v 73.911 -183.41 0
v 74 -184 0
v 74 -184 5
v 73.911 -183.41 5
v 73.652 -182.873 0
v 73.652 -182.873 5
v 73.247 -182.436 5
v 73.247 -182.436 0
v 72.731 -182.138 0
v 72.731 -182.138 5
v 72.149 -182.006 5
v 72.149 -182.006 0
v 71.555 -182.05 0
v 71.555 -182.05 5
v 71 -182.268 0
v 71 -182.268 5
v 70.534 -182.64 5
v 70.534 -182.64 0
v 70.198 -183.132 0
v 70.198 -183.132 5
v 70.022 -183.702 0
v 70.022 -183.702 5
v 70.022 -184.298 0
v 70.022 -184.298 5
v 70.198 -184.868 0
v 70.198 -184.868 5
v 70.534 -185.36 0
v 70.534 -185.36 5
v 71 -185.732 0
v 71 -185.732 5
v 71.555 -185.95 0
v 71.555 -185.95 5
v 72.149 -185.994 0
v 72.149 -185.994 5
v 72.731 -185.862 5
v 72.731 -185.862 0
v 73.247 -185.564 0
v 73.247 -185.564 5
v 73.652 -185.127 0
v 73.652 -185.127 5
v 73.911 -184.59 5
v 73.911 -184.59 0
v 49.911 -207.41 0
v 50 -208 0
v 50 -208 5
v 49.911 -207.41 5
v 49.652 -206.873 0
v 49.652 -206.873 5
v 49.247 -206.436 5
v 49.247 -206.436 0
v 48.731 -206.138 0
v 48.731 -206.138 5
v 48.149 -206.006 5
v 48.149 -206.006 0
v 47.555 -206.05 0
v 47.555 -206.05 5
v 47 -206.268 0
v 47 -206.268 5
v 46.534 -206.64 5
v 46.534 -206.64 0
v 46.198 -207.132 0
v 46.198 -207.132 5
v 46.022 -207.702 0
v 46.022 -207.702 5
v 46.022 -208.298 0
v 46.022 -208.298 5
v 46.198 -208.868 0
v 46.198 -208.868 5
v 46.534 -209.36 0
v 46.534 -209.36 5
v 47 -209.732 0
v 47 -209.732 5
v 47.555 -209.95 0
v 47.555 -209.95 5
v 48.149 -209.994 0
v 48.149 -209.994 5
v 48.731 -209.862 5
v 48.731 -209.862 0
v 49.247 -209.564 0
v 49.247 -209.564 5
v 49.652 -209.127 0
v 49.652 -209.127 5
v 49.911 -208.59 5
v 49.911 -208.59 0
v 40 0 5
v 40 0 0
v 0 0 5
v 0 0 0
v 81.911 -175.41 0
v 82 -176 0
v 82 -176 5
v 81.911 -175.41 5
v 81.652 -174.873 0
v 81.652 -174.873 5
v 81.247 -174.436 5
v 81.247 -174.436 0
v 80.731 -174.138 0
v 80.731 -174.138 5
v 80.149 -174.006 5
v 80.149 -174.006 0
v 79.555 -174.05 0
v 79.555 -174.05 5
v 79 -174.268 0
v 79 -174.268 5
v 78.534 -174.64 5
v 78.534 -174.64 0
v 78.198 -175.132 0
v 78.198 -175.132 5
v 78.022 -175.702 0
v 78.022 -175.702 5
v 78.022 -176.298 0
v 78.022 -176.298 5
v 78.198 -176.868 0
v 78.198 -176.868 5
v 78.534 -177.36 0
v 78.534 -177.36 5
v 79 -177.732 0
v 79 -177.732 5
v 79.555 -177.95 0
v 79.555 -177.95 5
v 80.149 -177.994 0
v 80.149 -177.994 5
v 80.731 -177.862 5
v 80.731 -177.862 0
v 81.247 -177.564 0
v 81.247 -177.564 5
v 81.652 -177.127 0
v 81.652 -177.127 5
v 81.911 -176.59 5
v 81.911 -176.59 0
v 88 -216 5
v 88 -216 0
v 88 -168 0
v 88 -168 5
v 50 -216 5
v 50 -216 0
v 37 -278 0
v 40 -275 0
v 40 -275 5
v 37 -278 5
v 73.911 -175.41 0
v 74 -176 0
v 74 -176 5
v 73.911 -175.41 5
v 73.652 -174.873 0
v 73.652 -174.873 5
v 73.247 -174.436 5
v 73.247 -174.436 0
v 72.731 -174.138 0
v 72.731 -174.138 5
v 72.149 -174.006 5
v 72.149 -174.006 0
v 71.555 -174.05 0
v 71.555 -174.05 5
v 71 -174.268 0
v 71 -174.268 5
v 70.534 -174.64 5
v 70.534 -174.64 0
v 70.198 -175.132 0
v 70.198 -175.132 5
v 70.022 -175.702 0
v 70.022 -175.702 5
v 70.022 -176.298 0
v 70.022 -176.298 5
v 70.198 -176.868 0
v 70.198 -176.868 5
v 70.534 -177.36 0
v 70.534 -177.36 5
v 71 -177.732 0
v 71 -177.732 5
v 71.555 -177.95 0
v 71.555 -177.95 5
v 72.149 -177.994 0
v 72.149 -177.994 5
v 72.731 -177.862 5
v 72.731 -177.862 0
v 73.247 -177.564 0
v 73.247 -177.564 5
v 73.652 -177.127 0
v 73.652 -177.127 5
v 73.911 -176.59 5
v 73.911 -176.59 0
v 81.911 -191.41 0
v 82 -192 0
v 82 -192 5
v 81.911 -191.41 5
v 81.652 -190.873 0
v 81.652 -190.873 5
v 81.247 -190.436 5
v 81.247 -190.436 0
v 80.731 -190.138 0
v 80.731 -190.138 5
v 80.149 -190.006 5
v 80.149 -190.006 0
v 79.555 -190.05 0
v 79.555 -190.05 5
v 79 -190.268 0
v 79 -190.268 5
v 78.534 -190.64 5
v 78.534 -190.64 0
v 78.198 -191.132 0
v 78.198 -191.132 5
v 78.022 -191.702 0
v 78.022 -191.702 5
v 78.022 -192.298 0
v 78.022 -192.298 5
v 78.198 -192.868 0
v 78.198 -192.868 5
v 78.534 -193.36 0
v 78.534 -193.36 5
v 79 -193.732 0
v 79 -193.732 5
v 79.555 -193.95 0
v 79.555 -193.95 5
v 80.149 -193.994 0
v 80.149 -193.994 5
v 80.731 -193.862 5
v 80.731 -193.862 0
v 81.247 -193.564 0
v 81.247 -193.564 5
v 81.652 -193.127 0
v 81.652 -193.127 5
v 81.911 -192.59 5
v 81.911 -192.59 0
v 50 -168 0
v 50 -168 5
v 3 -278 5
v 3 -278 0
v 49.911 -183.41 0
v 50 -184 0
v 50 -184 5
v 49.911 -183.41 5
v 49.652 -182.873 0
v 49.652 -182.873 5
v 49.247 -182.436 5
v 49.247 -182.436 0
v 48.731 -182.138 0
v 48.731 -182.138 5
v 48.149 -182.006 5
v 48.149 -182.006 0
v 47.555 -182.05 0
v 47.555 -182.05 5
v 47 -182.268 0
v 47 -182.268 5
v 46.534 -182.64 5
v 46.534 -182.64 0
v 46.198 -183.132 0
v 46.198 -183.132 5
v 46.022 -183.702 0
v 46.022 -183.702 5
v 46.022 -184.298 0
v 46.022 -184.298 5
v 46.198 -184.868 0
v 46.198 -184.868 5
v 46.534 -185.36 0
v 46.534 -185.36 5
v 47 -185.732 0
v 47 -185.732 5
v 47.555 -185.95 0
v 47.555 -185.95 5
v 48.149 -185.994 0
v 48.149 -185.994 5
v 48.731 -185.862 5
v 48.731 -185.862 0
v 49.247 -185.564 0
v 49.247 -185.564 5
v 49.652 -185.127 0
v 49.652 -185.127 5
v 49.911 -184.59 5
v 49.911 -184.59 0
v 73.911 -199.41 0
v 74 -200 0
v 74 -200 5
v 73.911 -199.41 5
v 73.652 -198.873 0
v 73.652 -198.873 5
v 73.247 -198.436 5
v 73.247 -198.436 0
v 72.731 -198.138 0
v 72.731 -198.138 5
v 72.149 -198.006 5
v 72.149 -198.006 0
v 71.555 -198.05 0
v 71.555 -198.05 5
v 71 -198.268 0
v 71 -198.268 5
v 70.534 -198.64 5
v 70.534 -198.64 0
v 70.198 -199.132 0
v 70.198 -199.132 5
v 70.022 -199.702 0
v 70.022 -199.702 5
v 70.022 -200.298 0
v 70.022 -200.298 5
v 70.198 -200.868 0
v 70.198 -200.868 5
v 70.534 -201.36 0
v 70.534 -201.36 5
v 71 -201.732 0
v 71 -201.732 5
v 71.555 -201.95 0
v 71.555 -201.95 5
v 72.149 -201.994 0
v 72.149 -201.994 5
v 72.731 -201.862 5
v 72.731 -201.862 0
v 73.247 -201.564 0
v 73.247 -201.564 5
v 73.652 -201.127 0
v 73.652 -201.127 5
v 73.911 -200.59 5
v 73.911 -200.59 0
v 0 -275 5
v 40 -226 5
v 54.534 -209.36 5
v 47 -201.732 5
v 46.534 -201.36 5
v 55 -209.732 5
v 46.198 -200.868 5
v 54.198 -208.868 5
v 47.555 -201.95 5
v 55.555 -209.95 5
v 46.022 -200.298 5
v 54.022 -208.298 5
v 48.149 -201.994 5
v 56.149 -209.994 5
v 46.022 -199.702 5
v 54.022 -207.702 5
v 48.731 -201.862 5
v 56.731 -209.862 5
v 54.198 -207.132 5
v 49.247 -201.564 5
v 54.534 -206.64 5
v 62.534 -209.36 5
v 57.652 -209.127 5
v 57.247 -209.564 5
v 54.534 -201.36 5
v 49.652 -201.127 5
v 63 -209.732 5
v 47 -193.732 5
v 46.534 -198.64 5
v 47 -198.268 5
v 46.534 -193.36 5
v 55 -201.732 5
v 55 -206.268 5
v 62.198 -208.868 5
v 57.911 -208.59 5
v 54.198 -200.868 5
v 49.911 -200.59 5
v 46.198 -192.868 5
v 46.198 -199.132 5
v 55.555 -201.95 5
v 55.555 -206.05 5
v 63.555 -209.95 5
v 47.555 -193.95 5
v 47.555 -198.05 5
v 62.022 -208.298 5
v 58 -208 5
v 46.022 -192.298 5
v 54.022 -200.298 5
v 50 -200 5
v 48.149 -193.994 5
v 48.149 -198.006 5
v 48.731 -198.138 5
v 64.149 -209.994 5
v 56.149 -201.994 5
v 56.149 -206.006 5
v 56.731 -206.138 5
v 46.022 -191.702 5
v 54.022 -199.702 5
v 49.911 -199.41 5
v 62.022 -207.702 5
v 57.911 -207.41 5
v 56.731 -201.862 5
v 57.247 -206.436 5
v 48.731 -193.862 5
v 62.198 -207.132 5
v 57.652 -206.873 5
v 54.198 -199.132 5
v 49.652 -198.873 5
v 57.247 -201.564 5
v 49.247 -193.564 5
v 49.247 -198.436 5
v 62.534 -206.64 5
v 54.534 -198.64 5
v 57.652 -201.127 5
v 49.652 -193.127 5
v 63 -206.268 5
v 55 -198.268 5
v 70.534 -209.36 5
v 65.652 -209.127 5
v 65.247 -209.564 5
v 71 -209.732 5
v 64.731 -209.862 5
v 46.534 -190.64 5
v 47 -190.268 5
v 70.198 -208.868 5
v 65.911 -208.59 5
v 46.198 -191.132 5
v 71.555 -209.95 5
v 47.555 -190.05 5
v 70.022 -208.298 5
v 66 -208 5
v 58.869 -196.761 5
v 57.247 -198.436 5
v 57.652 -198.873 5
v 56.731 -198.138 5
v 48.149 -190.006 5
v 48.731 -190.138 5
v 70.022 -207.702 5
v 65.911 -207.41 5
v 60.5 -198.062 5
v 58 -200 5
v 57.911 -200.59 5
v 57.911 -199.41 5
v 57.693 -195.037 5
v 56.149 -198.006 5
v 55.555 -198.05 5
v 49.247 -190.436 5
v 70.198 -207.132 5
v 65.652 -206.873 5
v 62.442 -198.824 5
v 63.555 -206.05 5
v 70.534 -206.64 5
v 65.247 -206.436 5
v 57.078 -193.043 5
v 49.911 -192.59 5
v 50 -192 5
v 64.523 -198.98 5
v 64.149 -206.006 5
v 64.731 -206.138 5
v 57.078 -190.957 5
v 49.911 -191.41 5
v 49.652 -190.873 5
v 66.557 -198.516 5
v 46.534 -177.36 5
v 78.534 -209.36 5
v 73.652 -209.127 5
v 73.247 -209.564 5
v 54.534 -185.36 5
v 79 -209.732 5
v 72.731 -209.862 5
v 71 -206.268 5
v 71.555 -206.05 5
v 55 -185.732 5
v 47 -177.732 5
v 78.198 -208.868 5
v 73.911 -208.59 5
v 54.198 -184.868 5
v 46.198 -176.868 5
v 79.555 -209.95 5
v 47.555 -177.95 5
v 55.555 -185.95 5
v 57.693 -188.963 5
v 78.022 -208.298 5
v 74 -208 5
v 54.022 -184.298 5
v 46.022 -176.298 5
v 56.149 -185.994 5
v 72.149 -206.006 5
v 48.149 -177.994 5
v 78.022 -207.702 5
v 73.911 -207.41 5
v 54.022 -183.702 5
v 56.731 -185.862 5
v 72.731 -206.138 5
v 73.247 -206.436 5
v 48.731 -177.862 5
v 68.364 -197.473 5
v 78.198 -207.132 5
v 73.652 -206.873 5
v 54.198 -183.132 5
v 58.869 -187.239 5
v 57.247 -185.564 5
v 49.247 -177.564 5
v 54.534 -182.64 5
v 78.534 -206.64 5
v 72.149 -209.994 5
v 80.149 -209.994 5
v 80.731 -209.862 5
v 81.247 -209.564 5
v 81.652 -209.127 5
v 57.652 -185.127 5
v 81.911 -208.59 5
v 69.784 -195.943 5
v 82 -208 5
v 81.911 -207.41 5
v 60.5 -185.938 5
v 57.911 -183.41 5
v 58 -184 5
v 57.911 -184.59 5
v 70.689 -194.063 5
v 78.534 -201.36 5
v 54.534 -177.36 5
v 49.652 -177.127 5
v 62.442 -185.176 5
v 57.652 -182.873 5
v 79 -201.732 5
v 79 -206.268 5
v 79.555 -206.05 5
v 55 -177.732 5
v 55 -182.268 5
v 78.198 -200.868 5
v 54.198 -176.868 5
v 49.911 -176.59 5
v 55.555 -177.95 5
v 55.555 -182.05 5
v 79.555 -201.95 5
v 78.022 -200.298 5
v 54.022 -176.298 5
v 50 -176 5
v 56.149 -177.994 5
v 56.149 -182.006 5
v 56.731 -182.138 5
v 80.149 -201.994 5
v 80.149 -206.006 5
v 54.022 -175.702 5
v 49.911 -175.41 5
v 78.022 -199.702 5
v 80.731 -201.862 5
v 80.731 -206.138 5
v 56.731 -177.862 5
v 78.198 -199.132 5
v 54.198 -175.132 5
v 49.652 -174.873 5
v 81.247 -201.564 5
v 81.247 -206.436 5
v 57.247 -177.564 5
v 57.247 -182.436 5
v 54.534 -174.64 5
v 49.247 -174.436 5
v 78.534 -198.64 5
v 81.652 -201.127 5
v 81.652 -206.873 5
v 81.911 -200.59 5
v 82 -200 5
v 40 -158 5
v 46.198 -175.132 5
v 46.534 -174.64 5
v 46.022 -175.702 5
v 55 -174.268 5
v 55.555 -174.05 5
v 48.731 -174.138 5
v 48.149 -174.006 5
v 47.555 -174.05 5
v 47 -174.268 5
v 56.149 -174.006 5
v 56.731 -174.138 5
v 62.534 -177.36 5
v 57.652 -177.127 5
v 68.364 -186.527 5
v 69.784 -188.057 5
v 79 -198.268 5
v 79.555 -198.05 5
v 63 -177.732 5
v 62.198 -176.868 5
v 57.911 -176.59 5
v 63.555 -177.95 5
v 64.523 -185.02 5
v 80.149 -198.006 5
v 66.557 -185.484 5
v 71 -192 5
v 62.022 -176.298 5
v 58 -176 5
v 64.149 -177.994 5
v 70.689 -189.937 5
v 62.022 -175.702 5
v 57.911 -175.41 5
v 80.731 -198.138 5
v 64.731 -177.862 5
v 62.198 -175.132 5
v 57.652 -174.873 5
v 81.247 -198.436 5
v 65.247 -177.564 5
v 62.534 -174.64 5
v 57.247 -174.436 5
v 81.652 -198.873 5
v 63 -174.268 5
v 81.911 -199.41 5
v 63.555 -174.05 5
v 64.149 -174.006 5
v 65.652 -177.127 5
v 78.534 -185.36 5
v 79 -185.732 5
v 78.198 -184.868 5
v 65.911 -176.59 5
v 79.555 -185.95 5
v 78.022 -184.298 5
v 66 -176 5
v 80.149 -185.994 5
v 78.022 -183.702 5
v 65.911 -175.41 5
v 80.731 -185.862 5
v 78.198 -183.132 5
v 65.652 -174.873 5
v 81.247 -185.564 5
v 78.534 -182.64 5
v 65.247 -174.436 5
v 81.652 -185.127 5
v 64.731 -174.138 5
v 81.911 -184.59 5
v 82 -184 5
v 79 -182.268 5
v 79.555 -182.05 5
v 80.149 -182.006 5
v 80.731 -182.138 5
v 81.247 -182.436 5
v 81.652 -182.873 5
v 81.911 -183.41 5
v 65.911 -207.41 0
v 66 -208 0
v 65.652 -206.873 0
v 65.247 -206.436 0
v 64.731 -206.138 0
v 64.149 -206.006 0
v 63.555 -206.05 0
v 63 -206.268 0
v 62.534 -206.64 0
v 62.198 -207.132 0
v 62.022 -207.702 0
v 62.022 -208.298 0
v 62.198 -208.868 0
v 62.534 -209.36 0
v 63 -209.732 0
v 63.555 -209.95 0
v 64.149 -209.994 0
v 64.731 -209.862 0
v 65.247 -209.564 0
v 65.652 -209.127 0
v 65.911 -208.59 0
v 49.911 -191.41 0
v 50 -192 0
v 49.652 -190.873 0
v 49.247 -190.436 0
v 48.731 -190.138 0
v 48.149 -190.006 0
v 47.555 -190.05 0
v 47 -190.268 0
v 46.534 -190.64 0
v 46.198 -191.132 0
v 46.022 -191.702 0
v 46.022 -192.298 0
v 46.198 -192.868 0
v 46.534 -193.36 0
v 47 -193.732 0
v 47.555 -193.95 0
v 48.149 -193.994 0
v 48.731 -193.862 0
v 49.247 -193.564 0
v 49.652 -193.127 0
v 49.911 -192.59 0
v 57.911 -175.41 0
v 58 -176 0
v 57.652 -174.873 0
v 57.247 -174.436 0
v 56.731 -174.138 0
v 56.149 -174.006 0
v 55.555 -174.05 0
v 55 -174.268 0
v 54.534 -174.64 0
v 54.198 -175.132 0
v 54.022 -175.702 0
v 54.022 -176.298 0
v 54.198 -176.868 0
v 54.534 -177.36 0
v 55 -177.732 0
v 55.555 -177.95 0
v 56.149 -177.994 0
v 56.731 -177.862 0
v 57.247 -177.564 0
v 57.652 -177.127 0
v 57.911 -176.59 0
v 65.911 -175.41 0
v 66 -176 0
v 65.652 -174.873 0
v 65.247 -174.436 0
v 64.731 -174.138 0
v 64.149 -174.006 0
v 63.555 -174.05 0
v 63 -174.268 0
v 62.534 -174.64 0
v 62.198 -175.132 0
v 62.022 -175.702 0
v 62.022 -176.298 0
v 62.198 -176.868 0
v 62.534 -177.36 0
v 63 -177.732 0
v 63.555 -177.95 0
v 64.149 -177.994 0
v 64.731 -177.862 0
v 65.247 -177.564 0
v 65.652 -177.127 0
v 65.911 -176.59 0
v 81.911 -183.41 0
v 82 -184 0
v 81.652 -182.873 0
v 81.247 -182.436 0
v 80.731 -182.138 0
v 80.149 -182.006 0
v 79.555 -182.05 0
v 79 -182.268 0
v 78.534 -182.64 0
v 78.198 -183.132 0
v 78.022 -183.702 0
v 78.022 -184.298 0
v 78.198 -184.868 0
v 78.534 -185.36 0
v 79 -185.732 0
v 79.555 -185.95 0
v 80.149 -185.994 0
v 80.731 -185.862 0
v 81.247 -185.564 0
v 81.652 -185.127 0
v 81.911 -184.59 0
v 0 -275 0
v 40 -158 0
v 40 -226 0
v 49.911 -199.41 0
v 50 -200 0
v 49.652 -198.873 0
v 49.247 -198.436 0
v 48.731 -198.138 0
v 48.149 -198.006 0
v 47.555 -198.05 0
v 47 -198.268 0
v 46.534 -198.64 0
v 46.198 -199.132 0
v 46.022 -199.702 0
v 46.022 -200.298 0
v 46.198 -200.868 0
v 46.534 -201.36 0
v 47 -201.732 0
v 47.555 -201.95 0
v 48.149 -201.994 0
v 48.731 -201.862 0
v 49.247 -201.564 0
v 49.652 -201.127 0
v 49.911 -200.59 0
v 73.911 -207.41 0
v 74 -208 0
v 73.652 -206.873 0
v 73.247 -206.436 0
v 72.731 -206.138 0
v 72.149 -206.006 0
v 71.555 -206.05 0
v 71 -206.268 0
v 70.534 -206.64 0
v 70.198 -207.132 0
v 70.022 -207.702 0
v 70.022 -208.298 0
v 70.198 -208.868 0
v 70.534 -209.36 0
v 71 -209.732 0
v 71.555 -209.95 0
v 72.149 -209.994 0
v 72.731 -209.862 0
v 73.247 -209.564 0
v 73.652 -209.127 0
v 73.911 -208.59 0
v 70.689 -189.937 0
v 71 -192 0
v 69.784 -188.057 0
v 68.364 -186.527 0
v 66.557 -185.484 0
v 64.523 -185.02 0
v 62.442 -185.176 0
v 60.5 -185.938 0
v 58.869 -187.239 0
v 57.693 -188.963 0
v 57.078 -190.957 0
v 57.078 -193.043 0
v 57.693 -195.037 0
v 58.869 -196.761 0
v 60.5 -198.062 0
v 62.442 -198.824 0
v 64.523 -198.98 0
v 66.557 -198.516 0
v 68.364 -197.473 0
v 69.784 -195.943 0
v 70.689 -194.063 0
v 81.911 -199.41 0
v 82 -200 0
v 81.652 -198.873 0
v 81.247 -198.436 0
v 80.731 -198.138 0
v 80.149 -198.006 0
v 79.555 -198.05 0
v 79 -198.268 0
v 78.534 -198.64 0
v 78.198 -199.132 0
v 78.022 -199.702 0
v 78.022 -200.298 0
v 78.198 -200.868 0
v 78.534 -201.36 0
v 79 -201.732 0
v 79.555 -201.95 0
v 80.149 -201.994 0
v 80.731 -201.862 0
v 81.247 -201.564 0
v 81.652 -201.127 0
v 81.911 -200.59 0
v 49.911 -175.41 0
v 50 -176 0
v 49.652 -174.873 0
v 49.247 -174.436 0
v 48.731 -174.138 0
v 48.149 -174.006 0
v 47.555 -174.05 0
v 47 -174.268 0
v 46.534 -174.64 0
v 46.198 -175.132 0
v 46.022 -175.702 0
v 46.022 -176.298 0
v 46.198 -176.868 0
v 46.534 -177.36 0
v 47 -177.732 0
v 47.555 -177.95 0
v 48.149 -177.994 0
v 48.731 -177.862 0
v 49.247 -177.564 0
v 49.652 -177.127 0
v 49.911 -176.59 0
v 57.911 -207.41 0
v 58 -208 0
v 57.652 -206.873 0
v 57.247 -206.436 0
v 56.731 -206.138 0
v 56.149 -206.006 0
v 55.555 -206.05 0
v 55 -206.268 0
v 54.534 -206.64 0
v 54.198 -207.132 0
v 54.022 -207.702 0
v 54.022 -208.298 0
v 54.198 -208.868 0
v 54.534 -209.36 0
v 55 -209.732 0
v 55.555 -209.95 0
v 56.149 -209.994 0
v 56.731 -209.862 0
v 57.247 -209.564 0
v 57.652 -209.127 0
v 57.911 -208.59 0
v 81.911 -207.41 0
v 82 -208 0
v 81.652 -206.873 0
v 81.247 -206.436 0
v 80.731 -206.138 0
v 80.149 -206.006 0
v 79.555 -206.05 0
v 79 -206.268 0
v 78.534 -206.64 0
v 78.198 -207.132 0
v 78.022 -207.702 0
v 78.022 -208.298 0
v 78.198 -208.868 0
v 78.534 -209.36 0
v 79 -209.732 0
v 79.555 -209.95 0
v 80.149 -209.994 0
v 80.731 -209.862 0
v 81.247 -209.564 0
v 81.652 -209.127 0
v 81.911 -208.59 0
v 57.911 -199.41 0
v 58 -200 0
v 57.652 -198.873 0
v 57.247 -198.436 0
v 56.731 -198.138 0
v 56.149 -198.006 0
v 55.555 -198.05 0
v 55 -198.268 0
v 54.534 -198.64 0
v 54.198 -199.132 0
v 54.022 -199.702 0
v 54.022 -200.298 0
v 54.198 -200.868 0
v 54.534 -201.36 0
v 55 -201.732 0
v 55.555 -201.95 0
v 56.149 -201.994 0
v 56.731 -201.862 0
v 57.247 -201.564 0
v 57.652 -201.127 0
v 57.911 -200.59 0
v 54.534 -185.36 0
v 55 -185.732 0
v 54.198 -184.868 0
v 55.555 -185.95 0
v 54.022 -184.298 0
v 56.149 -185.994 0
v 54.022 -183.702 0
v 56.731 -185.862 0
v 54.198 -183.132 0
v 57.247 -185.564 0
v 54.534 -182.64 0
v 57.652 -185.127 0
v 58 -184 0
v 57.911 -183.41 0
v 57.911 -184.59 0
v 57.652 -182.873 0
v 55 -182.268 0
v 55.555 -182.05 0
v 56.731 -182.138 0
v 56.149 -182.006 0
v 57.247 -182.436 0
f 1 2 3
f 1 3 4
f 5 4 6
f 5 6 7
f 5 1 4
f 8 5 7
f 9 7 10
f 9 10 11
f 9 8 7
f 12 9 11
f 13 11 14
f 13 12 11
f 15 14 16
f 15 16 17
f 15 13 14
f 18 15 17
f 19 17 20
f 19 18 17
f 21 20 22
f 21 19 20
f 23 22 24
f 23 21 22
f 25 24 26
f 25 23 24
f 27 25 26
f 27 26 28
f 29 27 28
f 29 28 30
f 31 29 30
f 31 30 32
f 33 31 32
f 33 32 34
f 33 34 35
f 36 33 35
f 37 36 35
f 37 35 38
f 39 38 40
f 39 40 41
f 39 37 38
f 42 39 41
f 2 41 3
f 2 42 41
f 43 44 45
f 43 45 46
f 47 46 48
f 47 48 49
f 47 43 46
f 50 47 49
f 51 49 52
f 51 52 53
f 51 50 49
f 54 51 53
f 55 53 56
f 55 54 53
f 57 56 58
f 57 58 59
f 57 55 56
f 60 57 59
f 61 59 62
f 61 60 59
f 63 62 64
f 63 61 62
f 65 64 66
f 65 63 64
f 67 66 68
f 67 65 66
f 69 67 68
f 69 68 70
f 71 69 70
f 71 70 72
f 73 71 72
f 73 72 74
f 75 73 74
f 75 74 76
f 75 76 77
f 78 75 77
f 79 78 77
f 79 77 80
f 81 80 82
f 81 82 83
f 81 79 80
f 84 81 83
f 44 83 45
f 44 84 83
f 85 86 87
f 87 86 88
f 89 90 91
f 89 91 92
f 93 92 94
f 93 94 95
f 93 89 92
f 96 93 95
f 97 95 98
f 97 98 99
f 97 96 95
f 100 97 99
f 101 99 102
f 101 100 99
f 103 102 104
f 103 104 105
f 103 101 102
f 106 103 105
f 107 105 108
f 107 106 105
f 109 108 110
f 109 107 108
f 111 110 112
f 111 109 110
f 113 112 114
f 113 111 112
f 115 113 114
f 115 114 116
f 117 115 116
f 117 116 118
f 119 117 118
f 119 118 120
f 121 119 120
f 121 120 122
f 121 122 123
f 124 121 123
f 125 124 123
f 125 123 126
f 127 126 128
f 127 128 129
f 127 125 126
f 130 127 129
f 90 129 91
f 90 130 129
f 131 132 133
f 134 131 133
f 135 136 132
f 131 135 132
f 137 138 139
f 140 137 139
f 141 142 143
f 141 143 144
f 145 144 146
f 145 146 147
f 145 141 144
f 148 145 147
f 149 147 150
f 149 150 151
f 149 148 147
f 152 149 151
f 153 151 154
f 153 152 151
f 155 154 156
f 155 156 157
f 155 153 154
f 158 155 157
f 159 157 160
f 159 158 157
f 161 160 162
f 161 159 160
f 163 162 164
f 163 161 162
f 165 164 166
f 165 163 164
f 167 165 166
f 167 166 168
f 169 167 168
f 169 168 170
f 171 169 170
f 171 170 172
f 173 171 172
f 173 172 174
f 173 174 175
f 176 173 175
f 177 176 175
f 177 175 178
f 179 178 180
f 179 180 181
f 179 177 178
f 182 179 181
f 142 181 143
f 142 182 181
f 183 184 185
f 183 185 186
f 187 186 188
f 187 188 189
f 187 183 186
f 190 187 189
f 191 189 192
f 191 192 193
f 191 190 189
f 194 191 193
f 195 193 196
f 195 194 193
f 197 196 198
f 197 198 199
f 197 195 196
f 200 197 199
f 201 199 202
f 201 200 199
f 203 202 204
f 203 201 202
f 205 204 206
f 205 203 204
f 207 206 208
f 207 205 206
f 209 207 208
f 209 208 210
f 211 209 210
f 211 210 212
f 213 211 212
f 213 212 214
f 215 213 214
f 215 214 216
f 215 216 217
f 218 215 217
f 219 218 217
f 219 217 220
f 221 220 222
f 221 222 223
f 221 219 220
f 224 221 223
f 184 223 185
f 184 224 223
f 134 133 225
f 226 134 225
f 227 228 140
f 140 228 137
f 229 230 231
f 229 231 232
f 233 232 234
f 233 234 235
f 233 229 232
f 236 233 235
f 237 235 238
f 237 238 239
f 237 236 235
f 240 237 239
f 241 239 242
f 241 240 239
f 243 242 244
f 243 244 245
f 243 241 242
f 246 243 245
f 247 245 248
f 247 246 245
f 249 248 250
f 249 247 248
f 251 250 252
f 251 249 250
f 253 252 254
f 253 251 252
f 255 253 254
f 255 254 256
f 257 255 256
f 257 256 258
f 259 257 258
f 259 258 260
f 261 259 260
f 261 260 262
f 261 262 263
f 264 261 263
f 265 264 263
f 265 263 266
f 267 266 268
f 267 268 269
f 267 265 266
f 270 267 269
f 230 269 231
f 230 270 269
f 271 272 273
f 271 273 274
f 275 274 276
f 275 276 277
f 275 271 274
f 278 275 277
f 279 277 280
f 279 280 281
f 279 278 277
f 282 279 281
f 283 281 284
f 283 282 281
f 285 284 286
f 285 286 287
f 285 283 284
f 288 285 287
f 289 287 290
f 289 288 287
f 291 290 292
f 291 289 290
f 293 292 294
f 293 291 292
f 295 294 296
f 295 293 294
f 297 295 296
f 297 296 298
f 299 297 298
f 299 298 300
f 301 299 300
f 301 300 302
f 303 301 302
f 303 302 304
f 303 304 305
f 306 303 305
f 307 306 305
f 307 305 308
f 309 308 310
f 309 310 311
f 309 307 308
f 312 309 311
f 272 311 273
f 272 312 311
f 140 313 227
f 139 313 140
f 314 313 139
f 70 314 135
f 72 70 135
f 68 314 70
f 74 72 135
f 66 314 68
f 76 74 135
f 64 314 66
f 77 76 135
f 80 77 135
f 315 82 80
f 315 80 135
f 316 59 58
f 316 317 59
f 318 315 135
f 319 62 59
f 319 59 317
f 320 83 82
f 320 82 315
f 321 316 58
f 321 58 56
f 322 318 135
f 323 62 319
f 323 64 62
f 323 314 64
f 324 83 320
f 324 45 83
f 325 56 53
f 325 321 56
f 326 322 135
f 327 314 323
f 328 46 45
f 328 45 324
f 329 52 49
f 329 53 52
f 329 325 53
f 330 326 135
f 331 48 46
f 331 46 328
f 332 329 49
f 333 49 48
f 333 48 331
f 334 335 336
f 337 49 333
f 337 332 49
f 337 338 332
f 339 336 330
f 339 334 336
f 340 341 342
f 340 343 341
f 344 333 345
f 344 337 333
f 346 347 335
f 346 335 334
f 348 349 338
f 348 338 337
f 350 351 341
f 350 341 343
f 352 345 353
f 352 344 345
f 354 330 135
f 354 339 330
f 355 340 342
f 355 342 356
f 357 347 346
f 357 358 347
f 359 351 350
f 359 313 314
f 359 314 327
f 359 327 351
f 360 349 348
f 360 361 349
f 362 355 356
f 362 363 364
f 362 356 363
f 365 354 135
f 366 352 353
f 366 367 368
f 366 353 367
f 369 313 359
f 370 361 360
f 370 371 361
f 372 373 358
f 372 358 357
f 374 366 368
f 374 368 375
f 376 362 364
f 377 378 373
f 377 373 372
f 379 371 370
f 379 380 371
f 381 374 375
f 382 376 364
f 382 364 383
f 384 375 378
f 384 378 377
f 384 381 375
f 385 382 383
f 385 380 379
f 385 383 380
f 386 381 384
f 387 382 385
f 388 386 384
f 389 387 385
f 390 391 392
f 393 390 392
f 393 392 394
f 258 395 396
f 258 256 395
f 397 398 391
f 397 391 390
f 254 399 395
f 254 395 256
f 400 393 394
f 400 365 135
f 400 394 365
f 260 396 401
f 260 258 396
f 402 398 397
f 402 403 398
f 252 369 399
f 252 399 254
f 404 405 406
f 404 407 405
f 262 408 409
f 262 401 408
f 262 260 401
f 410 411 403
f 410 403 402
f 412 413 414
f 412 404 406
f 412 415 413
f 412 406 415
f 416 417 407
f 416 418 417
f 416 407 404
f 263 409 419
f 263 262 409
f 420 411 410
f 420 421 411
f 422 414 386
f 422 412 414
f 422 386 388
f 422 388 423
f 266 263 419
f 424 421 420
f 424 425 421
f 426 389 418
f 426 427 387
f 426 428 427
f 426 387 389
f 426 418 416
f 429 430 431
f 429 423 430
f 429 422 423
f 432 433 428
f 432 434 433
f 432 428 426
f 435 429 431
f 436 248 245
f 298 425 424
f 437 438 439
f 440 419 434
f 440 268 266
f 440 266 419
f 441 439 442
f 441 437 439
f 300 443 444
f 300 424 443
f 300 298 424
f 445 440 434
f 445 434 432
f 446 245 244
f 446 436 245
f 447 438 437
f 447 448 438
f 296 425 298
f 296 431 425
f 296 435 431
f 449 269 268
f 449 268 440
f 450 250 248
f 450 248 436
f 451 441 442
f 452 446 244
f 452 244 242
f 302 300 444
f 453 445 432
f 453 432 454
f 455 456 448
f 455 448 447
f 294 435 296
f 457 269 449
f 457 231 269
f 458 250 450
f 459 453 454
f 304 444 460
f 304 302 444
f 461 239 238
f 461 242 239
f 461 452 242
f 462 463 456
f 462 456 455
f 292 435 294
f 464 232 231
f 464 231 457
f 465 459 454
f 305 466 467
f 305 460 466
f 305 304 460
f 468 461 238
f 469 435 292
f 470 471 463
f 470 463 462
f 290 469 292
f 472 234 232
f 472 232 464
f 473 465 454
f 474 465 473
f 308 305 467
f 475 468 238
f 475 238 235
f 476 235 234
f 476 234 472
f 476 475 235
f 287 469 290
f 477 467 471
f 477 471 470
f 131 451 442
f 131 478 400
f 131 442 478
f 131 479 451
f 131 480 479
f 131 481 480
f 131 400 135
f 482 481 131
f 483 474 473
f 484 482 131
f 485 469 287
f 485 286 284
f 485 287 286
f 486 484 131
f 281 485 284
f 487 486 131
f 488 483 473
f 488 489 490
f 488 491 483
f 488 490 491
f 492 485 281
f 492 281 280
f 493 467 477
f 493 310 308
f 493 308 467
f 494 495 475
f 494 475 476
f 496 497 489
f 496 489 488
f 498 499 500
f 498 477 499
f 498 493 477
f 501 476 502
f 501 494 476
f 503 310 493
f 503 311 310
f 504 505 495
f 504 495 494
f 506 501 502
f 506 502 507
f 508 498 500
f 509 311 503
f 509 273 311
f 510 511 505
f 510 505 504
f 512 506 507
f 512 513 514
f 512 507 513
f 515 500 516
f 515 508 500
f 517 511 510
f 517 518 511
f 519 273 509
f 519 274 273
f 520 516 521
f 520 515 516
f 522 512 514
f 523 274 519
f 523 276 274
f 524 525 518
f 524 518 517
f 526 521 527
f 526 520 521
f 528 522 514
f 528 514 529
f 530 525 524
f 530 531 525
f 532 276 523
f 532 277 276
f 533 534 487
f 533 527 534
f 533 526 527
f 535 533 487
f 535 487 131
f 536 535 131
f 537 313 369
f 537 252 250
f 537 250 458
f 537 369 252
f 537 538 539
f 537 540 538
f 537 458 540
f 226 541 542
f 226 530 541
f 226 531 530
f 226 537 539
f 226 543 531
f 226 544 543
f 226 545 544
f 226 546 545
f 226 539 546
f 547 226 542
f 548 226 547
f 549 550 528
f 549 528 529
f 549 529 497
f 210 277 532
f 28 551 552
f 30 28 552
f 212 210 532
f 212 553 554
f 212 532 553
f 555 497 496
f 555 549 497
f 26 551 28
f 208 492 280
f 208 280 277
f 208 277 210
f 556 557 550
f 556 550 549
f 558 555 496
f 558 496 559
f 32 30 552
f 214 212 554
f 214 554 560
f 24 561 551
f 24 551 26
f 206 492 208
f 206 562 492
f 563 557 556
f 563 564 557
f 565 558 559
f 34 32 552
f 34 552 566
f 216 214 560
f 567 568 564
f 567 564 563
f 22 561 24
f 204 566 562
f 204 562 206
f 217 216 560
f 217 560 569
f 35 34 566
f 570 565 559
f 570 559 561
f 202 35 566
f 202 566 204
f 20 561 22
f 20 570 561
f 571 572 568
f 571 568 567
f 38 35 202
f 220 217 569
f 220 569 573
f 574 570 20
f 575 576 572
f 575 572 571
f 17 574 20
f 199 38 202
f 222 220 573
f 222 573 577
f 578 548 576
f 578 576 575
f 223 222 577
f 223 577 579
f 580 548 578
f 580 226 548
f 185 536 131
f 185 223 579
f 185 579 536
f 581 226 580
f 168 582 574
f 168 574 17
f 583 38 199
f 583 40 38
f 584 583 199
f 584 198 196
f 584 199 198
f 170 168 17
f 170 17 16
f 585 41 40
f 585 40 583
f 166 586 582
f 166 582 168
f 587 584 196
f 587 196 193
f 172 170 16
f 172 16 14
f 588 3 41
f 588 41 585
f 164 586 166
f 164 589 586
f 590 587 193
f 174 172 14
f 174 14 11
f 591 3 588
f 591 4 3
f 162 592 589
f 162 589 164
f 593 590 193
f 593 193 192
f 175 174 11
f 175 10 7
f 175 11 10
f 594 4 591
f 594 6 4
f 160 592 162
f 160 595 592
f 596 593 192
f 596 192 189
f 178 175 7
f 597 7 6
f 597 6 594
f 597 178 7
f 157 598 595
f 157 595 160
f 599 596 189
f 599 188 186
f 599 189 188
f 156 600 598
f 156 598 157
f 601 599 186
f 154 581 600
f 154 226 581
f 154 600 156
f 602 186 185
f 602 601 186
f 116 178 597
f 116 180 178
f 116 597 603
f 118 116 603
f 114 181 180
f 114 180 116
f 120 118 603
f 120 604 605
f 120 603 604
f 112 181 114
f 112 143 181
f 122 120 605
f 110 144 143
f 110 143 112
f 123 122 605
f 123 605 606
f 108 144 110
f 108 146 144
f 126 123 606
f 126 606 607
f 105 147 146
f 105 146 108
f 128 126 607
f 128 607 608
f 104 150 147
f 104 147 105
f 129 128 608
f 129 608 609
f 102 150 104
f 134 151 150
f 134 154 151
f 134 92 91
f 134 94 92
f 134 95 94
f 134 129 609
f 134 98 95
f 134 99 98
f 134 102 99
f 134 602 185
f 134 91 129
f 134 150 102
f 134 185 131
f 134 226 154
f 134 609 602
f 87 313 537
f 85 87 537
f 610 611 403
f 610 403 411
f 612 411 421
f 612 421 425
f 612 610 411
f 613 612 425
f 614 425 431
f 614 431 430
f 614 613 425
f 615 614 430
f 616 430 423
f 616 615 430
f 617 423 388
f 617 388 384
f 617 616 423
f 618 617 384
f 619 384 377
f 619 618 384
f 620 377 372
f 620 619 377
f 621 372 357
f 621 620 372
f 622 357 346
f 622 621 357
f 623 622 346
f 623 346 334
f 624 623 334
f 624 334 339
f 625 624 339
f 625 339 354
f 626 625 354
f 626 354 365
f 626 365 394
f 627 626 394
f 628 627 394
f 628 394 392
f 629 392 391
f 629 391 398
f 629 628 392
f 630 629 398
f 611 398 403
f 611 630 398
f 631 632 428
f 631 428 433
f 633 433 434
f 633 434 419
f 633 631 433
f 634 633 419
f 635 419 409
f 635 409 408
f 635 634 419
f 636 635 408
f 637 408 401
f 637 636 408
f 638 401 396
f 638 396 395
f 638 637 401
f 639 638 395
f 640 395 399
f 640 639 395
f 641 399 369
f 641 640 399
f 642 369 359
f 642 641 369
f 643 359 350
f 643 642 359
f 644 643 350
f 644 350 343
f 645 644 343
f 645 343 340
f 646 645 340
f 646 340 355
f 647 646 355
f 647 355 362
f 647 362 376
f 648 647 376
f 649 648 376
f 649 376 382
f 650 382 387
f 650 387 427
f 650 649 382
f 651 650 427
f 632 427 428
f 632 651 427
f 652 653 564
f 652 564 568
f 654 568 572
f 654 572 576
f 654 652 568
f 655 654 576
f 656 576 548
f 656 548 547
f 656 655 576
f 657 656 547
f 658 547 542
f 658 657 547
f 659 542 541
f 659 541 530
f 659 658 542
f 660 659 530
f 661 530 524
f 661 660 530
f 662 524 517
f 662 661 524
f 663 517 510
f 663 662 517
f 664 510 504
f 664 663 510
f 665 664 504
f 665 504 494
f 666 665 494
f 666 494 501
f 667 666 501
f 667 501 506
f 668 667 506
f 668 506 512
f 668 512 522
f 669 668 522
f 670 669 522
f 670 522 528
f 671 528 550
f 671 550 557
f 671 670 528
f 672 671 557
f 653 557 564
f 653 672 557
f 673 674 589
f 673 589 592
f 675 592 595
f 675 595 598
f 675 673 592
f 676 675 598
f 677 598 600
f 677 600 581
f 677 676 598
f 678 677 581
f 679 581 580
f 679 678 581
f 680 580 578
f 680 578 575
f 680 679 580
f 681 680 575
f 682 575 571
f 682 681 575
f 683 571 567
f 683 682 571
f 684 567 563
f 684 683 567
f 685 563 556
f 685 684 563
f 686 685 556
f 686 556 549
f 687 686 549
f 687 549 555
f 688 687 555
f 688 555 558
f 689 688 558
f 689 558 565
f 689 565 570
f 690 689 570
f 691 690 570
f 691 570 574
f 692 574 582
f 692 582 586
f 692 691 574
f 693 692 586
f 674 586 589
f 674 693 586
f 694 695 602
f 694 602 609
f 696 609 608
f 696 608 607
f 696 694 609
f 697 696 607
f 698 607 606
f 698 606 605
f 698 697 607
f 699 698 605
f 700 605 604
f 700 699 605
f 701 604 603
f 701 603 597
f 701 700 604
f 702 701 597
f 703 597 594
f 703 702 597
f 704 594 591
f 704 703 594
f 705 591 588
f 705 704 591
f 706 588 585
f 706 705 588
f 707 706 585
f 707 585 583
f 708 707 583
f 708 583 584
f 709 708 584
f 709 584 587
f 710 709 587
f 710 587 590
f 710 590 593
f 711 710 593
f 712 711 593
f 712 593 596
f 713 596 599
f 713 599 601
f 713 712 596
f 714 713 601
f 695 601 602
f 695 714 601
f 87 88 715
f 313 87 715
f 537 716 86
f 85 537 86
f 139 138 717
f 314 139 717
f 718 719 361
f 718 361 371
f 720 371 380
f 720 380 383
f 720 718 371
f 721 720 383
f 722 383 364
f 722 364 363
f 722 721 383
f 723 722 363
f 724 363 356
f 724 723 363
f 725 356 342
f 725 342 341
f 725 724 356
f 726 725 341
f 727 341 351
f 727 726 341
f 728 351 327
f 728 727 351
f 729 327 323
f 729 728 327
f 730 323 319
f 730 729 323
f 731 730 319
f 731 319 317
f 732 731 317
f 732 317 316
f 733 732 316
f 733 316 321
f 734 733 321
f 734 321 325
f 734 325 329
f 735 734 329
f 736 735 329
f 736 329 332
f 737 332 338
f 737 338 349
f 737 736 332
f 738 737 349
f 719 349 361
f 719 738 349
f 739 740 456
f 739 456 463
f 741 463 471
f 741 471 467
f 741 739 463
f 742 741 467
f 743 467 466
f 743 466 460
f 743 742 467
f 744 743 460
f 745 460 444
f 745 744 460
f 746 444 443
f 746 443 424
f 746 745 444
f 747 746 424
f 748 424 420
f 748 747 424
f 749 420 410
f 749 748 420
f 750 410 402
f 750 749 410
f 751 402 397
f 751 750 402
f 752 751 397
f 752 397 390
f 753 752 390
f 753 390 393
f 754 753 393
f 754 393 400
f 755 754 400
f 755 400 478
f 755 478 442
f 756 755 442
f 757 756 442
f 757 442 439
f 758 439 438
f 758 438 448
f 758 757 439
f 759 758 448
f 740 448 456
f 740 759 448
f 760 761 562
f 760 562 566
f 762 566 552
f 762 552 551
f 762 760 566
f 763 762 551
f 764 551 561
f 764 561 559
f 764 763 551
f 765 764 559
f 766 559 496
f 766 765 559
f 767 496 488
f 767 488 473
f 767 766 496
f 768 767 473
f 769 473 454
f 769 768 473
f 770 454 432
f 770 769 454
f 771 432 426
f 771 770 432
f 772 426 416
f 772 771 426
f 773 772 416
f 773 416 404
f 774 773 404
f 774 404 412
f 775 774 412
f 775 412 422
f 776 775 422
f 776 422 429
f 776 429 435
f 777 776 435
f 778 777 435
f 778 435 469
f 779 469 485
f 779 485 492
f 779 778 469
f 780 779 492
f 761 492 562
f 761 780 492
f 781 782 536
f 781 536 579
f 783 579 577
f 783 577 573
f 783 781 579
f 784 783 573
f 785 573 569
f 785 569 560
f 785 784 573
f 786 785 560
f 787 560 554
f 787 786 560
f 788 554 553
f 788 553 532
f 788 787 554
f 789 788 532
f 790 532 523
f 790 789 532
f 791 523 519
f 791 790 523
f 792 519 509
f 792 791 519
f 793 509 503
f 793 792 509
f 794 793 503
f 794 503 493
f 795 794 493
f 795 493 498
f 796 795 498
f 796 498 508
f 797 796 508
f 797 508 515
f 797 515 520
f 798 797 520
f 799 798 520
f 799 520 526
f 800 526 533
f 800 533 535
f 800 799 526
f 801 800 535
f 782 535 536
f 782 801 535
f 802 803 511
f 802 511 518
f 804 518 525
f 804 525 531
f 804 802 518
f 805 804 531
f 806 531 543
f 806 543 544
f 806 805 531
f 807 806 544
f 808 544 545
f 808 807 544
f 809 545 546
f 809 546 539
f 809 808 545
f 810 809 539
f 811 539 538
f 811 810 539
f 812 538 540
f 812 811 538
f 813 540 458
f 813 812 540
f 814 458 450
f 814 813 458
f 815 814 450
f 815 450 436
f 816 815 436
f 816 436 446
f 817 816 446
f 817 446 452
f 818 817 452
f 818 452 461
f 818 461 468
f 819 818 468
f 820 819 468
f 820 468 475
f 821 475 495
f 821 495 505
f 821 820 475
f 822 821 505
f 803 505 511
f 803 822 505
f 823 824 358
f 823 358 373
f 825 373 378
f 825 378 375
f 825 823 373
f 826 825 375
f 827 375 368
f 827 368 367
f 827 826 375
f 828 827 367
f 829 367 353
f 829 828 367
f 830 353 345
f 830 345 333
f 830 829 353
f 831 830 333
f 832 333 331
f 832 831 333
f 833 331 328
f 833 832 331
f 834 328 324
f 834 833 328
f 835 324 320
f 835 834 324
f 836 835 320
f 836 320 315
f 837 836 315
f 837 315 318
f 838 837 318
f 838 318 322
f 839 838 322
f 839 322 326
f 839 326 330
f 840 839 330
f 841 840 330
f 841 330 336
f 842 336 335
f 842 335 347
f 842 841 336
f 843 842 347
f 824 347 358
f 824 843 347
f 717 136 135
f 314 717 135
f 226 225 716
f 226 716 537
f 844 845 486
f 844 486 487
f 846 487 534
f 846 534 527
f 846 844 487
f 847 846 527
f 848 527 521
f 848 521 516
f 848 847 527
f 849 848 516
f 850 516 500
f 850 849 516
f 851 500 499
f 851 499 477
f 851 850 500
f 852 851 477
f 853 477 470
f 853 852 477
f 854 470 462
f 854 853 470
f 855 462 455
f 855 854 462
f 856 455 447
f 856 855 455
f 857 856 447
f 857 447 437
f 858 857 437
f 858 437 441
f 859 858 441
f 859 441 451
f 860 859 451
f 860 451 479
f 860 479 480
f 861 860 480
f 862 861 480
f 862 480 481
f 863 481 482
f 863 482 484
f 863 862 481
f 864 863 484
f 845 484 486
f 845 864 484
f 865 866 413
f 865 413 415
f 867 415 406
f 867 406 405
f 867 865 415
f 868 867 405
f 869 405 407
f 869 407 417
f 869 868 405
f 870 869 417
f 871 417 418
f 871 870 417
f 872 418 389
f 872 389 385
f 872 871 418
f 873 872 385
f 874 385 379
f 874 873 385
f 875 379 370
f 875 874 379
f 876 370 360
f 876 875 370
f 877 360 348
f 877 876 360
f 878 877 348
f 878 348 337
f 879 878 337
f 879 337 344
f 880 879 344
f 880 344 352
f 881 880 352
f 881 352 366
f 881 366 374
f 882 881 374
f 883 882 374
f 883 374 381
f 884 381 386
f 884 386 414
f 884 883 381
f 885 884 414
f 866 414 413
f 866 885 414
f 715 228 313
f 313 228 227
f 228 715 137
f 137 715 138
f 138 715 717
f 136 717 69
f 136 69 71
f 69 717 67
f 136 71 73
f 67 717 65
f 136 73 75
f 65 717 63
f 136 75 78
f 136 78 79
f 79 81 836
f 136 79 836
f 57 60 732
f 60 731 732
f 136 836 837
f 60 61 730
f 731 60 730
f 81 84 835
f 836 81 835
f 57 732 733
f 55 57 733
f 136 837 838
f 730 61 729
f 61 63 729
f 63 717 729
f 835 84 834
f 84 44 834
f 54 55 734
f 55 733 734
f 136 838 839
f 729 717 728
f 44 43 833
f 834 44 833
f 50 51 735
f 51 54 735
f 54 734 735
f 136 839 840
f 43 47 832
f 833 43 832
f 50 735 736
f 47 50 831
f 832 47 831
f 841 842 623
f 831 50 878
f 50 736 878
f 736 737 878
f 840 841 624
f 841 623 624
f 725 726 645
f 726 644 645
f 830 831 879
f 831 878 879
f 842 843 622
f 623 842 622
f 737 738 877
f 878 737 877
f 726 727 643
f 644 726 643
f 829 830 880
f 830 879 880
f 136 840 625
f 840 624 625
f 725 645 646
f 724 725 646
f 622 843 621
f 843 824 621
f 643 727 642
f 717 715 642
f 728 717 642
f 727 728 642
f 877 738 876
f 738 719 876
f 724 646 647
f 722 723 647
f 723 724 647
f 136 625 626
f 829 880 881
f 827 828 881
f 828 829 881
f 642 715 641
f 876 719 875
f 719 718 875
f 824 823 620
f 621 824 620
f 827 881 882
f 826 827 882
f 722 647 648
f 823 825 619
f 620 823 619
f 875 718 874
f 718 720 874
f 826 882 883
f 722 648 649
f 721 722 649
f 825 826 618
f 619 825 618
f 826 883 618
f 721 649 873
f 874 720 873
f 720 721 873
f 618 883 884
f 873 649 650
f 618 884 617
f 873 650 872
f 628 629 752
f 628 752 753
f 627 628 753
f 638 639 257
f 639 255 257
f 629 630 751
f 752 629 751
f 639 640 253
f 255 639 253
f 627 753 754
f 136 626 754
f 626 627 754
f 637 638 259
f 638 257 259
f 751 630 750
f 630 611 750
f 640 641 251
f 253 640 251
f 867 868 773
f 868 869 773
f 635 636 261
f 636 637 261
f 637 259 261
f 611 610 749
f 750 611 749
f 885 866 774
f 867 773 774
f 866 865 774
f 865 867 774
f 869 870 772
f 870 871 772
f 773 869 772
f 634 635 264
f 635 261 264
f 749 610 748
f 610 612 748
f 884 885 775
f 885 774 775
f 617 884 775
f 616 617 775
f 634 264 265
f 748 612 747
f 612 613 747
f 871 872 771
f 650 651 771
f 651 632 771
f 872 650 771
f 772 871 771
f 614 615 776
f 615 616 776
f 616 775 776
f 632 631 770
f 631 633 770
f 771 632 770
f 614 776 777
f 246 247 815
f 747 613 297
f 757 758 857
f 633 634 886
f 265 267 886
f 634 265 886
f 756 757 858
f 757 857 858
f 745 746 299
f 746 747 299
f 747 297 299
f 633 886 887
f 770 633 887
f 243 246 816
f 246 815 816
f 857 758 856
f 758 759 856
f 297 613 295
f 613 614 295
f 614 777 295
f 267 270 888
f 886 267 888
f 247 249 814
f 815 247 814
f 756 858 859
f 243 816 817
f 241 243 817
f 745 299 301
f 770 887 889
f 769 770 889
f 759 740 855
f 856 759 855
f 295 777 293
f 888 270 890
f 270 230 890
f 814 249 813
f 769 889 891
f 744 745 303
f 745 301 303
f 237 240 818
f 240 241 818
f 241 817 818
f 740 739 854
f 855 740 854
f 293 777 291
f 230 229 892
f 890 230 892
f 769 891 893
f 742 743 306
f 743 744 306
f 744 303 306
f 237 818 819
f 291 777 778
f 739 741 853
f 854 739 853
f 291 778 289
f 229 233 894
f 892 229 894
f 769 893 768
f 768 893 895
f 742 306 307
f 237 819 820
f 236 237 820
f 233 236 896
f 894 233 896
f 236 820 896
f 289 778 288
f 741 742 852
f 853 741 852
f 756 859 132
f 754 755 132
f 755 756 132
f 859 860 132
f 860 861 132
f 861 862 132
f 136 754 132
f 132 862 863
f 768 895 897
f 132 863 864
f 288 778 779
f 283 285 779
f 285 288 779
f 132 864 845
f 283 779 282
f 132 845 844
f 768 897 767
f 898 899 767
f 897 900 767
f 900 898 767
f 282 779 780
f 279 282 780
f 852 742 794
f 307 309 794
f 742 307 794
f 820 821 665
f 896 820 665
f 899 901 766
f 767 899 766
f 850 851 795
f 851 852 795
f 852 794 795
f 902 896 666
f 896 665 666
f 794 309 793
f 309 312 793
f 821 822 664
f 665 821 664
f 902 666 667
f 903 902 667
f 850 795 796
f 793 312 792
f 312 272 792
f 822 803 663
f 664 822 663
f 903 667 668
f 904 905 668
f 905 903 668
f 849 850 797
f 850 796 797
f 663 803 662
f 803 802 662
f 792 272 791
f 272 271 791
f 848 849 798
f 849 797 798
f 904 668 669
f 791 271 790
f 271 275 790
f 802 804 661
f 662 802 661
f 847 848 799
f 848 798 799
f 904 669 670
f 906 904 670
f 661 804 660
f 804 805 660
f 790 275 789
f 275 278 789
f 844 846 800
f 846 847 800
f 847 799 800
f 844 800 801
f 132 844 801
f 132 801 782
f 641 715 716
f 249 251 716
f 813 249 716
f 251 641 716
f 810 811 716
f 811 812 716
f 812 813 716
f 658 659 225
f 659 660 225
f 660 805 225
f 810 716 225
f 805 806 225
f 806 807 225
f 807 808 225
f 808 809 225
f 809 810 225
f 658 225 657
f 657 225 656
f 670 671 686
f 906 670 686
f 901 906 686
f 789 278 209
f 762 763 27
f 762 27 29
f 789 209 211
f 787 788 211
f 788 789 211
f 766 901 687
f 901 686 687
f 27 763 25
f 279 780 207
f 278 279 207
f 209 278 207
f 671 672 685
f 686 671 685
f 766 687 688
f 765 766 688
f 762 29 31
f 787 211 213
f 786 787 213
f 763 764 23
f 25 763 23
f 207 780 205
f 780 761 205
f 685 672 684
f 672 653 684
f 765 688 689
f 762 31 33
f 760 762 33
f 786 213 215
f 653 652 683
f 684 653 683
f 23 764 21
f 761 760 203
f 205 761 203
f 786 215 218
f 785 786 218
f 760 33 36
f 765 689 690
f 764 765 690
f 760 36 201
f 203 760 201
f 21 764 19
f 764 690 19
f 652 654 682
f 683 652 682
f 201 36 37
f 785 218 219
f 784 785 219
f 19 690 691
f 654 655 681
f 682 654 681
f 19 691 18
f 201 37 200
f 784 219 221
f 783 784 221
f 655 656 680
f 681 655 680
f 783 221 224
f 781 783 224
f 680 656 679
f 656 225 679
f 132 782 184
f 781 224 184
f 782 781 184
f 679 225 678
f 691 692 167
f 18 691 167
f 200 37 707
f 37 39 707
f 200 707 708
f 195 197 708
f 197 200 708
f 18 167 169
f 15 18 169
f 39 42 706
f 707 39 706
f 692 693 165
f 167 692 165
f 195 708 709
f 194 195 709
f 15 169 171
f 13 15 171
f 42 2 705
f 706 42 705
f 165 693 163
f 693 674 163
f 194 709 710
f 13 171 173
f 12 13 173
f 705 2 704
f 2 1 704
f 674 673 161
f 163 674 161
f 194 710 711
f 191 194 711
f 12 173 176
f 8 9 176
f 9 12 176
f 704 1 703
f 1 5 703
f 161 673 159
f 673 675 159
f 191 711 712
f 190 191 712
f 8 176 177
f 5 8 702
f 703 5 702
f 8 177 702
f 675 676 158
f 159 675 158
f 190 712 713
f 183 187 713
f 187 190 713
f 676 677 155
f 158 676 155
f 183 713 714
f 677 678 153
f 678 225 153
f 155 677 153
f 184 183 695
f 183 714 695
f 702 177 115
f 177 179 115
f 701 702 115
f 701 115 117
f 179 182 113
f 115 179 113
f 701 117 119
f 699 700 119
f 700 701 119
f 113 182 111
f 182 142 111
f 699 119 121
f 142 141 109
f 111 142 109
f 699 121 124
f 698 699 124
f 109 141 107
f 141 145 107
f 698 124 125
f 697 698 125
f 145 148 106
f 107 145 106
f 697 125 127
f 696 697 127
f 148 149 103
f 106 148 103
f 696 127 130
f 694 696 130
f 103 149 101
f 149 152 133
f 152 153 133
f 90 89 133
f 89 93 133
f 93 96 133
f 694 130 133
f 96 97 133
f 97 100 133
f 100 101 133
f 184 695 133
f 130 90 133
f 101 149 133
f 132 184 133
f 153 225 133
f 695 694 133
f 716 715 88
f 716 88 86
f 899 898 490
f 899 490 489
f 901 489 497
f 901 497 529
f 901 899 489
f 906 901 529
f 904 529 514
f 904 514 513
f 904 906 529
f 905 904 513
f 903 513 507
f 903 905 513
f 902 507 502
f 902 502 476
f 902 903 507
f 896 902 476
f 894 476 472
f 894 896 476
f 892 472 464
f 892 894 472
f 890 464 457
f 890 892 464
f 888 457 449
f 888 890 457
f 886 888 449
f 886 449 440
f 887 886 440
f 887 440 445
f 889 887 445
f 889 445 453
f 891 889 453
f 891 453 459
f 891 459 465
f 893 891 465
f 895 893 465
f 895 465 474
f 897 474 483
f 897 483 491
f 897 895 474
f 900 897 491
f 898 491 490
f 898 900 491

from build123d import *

# Parameters (mm, degrees)
SKETCH1_R           = 7
SKETCH1_R_2         = 2
BOSS_EXTRUDE1_DEPTH = 5
CHAMFER2_SIZE       = 3
CHAMFER3_SIZE       = 10


with BuildPart() as part:
    # Sketch1 → Boss-Extrude1 (new body)
    with BuildSketch(Plane.XY):
        Polygon((0, 0), (0, -278), (40, -278), (40, -216), (88, -216), (88, -168), (40, -168), (40, 0), align=None)
        with Locations((64, -192)):
            Circle(SKETCH1_R, mode=Mode.SUBTRACT)
        with Locations((48, -176)):
            Circle(SKETCH1_R_2, mode=Mode.SUBTRACT)
        with Locations((56, -176)):
            Circle(SKETCH1_R_2, mode=Mode.SUBTRACT)
        with Locations((64, -176)):
            Circle(SKETCH1_R_2, mode=Mode.SUBTRACT)
        with Locations((72, -176)):
            Circle(SKETCH1_R_2, mode=Mode.SUBTRACT)
        with Locations((80, -176)):
            Circle(SKETCH1_R_2, mode=Mode.SUBTRACT)
        with Locations((56, -184)):
            Circle(SKETCH1_R_2, mode=Mode.SUBTRACT)
        with Locations((72, -184)):
            Circle(SKETCH1_R_2, mode=Mode.SUBTRACT)
        with Locations((80, -184)):
            Circle(SKETCH1_R_2, mode=Mode.SUBTRACT)
        with Locations((80, -192)):
            Circle(SKETCH1_R_2, mode=Mode.SUBTRACT)
        with Locations((56, -200)):
            Circle(SKETCH1_R_2, mode=Mode.SUBTRACT)
        with Locations((72, -200)):
            Circle(SKETCH1_R_2, mode=Mode.SUBTRACT)
        with Locations((80, -200)):
            Circle(SKETCH1_R_2, mode=Mode.SUBTRACT)
        with Locations((56, -208)):
            Circle(SKETCH1_R_2, mode=Mode.SUBTRACT)
        with Locations((64, -208)):
            Circle(SKETCH1_R_2, mode=Mode.SUBTRACT)
        with Locations((72, -208)):
            Circle(SKETCH1_R_2, mode=Mode.SUBTRACT)
        with Locations((80, -208)):
            Circle(SKETCH1_R_2, mode=Mode.SUBTRACT)
        with Locations((48, -184)):
            Circle(SKETCH1_R_2, mode=Mode.SUBTRACT)
        with Locations((48, -192)):
            Circle(SKETCH1_R_2, mode=Mode.SUBTRACT)
        with Locations((48, -200)):
            Circle(SKETCH1_R_2, mode=Mode.SUBTRACT)
        with Locations((48, -208)):
            Circle(SKETCH1_R_2, mode=Mode.SUBTRACT)
    extrude(amount=BOSS_EXTRUDE1_DEPTH)

    # Chamfer2
    chamfer2_edges = [part.edges().sort_by_distance(p)[0] for p in [
        (40, -278, 2.5),
        (0, -278, 2.5),
    ]]
    chamfer(chamfer2_edges, length=CHAMFER2_SIZE)

    # Chamfer3
    chamfer3_edges = [part.edges().sort_by_distance(p)[0] for p in [
        (40, -168, 2.5),
        (40, -216, 2.5),
    ]]
    chamfer(chamfer3_edges, length=CHAMFER3_SIZE)


solid = part.part
